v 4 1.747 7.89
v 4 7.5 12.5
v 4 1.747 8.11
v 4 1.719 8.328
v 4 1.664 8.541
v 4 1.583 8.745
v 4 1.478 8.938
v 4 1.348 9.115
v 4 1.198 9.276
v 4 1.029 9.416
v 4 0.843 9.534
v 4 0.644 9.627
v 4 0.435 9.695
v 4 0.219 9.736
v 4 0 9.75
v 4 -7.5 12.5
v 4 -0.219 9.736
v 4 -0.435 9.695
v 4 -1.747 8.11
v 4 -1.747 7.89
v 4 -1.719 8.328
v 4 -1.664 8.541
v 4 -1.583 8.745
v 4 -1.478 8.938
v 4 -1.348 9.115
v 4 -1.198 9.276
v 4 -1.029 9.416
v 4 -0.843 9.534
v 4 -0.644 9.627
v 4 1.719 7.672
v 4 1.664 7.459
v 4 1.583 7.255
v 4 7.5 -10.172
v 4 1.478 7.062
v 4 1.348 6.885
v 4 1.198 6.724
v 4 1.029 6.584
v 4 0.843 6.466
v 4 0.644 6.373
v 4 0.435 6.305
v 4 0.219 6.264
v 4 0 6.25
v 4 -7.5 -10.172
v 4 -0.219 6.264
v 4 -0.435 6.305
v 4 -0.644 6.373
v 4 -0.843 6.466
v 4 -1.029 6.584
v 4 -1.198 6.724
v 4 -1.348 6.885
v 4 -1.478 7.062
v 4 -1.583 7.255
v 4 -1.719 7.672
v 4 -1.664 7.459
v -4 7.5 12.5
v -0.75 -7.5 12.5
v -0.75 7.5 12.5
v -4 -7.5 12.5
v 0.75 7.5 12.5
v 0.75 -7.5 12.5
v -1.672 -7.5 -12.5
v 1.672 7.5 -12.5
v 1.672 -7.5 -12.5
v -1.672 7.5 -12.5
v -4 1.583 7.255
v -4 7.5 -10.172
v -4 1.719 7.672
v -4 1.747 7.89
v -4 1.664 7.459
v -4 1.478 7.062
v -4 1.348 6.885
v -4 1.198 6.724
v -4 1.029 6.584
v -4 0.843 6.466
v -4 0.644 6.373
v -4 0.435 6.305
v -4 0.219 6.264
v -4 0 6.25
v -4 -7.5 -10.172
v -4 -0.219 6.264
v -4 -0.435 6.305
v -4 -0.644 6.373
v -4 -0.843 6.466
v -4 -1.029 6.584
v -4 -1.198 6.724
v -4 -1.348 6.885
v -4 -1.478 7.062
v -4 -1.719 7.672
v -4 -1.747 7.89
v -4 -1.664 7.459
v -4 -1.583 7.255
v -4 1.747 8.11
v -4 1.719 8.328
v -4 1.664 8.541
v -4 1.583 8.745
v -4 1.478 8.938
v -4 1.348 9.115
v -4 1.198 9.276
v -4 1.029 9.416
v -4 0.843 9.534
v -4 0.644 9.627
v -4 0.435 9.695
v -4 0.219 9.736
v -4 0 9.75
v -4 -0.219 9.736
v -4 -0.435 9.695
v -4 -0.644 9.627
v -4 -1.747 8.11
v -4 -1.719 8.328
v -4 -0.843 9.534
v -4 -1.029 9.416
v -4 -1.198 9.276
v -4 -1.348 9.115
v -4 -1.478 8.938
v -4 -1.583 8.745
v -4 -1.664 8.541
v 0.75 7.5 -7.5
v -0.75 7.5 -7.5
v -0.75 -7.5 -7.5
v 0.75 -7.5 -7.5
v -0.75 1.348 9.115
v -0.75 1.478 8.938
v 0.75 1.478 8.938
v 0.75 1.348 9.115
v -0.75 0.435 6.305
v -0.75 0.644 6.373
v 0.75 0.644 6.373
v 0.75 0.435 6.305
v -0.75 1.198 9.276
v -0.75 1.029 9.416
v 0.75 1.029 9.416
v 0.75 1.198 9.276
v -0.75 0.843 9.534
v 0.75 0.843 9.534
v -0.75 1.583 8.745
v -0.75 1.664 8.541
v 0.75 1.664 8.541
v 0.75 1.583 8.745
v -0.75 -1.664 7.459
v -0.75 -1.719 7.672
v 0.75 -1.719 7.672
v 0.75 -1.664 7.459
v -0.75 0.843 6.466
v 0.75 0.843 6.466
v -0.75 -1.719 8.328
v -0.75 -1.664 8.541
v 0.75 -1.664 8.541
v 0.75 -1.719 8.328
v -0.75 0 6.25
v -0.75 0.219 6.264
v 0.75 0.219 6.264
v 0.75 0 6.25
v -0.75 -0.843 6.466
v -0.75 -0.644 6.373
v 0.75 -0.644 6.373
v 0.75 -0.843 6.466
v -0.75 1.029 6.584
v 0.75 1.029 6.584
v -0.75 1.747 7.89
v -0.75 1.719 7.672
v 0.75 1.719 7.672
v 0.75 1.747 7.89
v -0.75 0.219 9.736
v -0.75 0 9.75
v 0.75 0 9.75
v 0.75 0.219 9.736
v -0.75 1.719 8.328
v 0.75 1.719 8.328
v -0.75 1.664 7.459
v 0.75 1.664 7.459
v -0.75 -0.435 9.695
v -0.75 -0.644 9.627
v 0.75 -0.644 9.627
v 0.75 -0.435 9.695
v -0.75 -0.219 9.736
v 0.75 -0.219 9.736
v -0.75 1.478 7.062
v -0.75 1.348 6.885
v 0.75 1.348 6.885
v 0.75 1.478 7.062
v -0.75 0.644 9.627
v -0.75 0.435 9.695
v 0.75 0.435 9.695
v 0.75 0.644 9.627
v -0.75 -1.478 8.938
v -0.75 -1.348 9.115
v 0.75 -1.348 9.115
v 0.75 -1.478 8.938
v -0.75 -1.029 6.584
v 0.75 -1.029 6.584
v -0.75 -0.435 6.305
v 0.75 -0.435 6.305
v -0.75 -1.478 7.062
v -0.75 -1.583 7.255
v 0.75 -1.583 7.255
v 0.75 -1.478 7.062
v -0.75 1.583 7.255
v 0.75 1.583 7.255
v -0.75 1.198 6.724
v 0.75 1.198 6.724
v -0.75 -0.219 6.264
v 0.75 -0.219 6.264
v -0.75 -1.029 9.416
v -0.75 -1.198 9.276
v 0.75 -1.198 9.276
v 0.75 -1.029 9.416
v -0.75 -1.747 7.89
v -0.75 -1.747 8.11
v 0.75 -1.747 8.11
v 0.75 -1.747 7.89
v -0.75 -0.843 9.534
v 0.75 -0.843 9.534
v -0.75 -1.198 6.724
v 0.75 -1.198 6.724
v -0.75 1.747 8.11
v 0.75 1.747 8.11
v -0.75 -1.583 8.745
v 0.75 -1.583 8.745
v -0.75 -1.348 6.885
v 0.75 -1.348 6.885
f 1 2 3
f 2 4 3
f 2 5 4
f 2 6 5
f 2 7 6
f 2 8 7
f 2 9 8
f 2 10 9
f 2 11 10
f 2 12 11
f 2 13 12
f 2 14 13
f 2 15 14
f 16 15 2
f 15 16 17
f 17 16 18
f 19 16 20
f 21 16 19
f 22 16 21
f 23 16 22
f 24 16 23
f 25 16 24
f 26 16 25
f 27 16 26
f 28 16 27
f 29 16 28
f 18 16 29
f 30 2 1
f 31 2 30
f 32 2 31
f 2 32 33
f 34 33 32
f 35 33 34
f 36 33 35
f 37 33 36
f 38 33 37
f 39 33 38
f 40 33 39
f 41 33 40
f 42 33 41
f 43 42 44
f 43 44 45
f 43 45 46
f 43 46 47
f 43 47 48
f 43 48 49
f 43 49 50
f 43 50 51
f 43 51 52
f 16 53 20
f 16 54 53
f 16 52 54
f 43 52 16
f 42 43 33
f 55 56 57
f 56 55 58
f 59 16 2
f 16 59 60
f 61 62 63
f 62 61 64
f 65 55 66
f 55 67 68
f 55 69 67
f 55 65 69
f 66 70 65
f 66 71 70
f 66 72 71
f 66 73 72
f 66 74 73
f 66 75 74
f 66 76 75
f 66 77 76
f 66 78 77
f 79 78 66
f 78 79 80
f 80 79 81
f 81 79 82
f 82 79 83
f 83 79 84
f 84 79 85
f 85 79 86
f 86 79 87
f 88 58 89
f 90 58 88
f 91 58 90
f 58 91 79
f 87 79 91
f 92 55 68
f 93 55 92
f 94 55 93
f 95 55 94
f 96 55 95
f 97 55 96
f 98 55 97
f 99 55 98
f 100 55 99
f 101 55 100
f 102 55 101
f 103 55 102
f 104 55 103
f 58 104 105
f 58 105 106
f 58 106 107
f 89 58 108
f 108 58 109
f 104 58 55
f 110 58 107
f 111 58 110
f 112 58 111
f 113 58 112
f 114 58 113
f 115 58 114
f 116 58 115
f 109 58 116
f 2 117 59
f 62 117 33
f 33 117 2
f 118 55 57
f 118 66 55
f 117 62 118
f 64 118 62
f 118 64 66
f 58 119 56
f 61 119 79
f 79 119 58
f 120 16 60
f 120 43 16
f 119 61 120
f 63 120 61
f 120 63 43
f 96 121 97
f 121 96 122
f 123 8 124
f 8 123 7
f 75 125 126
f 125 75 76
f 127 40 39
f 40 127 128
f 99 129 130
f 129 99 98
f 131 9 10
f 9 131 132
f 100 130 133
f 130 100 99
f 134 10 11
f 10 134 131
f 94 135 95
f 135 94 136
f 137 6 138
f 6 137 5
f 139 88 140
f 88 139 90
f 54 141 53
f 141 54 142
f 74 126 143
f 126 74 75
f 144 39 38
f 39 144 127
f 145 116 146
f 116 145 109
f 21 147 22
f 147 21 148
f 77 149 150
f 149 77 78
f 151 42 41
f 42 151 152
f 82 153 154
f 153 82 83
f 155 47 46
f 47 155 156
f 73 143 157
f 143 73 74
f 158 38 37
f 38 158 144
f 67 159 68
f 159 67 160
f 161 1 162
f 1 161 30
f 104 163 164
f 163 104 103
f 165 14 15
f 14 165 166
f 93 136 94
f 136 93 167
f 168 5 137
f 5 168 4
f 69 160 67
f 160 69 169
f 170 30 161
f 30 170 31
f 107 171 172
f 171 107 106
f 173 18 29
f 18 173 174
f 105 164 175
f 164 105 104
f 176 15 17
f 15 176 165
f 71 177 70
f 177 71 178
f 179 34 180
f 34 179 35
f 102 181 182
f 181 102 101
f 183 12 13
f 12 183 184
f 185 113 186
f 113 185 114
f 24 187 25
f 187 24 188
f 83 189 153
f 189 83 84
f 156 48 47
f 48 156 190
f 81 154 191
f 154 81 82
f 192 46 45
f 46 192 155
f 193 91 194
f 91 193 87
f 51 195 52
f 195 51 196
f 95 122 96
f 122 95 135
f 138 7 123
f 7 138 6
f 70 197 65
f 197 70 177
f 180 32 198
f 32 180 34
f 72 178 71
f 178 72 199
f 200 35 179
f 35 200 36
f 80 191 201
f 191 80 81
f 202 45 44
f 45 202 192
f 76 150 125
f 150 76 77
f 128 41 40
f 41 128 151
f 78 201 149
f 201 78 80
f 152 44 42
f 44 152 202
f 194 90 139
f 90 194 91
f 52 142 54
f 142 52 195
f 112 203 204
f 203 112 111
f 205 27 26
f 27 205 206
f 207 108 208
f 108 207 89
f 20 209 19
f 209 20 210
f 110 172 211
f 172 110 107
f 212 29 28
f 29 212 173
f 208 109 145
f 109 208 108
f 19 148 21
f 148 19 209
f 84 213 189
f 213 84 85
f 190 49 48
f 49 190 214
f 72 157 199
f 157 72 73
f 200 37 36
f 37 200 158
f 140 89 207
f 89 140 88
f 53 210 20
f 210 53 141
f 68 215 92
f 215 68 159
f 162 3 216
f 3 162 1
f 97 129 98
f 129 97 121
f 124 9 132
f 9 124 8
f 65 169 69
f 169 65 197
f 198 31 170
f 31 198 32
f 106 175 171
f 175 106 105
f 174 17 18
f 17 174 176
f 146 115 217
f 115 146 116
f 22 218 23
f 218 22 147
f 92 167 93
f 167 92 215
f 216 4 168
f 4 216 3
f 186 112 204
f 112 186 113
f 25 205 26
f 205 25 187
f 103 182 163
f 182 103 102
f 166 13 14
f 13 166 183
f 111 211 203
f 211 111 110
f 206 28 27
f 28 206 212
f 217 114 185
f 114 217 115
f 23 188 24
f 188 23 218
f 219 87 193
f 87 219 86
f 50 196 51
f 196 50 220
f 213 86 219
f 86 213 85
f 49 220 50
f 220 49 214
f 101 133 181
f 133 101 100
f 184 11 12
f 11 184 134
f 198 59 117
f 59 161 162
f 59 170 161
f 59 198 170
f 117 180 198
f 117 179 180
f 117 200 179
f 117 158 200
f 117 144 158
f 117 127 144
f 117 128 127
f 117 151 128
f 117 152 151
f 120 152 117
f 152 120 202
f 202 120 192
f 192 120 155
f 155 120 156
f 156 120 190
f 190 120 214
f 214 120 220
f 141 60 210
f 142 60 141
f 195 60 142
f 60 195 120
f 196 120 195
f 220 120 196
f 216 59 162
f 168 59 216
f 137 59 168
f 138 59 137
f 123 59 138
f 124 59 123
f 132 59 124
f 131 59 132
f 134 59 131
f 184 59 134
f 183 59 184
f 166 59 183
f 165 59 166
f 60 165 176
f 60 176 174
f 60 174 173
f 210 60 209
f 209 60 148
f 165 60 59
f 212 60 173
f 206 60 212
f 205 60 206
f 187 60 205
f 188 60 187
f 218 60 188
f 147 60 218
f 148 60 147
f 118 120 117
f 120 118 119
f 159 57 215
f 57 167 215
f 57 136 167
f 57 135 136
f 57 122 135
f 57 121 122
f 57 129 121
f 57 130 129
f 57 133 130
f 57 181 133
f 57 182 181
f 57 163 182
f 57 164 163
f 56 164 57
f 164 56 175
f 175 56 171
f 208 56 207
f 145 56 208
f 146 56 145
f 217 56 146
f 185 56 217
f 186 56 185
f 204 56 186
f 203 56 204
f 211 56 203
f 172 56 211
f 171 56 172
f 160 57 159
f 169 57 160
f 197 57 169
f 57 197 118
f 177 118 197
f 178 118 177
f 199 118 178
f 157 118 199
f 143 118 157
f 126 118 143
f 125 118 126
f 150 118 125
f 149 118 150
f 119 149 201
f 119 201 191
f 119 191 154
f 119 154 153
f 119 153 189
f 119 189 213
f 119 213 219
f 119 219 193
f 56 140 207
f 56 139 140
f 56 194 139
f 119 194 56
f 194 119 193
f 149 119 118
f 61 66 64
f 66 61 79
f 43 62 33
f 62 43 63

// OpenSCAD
include <MCAD/motors.scad>
include <MCAD/metric_fastners.scad>
include <MCAD/math.scad>

//motor (Nema17);

//cylinder (r=4, h=10);
mount_thickness = 15;
slot_width = 3;
slot_depth = 4;
tolerance = .02;
hole_offset = -30;
axle_spacing = 60;
bolt_hole_size = 3.5;
bolt_hole_distance = 1.220*mm_per_inch;
slide_distance = 0;
pilot_diameter = 29;

module axle_mount ()
{
difference(){
	translate([0, -5, -7.5])cube([20, 70, mount_thickness], center = true);
 	translate([0, hole_offset, 1]) rotate (a = [0, 180, 90]) flat_nut(8+tolerance);
	%translate([0, hole_offset, 0])cylinder(r = (4 + tolerance), h = 50, center = true);
	}
}
module double_axle_side ()
{
difference(){
	union(){
		translate ([axle_spacing/2, hole_offset, mount_thickness])axle_mount ();
		translate ([-axle_spacing/2, hole_offset, mount_thickness])axle_mount ();	
		translate ([0,-20,7.5])cube ([40, 40, 15], center = true);
		}
	translate([0, -75, 0])rotate(a = [0,0,45])cube ([40,40, 17], center = false);
	translate([0, -5, 15 - (slot_depth-tolerance)/2]) cube([100, slot_width, slot_depth+tolerance], center = true);
	translate([0, -5, (slot_depth-tolerance)/2]) cube([100, slot_width, slot_depth+tolerance], center = true);

	}
}



module nema17_mount_holes(){
for (x = [-1,1])
	{
		for (y = [-1,1])
		{
			translate([x*bolt_hole_distance/2,y*bolt_hole_distance/2,0])
			{
				translate([0,slide_distance/2,0]) cylinder(r =(bolt_hole_size/2 + tolerance), h = 30, center = true);
				translate([0,-slide_distance/2,0]) cylinder(r =(bolt_hole_size/2 + tolerance), h = 30, center = true);
				translate([0,0,6]) cylinder(r =(4), h = 10, center = true);

			}
		}
	}

translate([0,0,0]) cylinder(r = (pilot_diameter/2 + tolerance), h = 30, center = true);
}


//build the object below from modules above
//

//tension block left
/*
difference(){
union(){
translate([0, 12.5, 10])cube ([12, 55, 50], center = true);
translate([0, 27.5, -5])cube([12, 25, 40], center = true);	
}
	translate([0, -5, 0])double_axle_side();
	translate ([0, mount_thickness, -5])rotate(a = [90,0,0])double_axle_side();
	translate([0, 25, 5])rotate(a = [0, 0, 0])union(){
		translate([0, 0, 12.5])rotate(a = [0, 90, 0])cylinder(r = 4.1, h = 30, center = true);
		cube([30, 8.2, 25], center = true);
		translate([5, 0, 0])cube([10, 13.3, 40], center = true);
		translate([0, 0, -12.5])rotate(a = [0, 90, 0])cylinder(r = 4.1, h = 30, center = true);
	}
}
*/
//tension block right
/*
difference(){
union(){
translate([0, 12.5, 10])cube ([12, 55, 50], center = true);
translate([0, 27.5, -5])cube([12, 25, 40], center = true);	
}
	translate([0, -5, 0])double_axle_side();
	translate ([0, mount_thickness, -5])rotate(a = [90,0,0])double_axle_side();
	translate([0, 25, 5])rotate(a = [0, 0, 180])union(){
		translate([0, 0, 12.5])rotate(a = [0, 90, 0])cylinder(r = 4.1, h = 30, center = true);
		cube([30, 8.2, 25], center = true);
		translate([5, 0, 0])cube([10, 13.3, 40], center = true);
		translate([0, 0, -12.5])rotate(a = [0, 90, 0])cylinder(r = 4.1, h = 30, center = true);
	}
}
*/

//side axle piece
/*
double_axle_side();
*/

//belt clamp (reversible)
/*
difference(){
	union(){
		translate([0,0,50])cube ([80, 30, 15], center = true);
		translate([0,-2,41])rotate([-45, 0, 0])cube ([10, 20, 15], center = true);
		}
	translate([0,12,55])rotate([-45, 0, 0])cube ([80, 30, 15], center = true);
	translate([30,-8,50])cylinder(r = 4.1, h = 30, center = true);
	translate([-30,-8,50])cylinder(r = 4.1, h = 30, center = true);
	translate([0, 0, 45])rotate([-45, 0, 0])cube([3, 12, 65], center = true);
//	translate([0,0, 32.5])rotate([0, 0, 0])cube([3, 60, 20], center = true);
//	translate([0, 0, 35])rotate([0, 90, 0])cylinder(r = bolt_hole_size/2, h = 20, center = true);
	};
*/

//belt clip
difference(){
	union(){
		cube ([8, 15, 25], center = true);
	}
	translate([0, 0, 8])rotate([0, 90, 0])cylinder(r = bolt_hole_size/2, h = 20, center = true);
	translate([0,0,5])cube ([1.5, 20, 25], center = true);	
	translate([-4,0, -13]) rotate([0, 45, 0]) cube([4, 20, 4], center = true);
	translate([4,0, -13]) rotate([0, 45, 0]) cube([4, 20, 4], center = true);

}
//motor mount block
/*
translate([-40, 0, 0])
difference(){
	union(){
		translate([0, 20, 20])cube ([8, 70, 70], center = true);
		translate([15, -5, 2.5])cube([30, 20, 35], center = true);
		translate([15, 2.5, -5])cube([30, 35, 20], center = true);
		}
	translate([0, -5, 0])double_axle_side();
	translate ([0, mount_thickness, -5])rotate(a = [90,0,0])double_axle_side();
	translate([0, 27, 27])rotate(a = [45, 0, 0])rotate(a = [0, 90, 0])nema17_mount_holes();
}
*/
